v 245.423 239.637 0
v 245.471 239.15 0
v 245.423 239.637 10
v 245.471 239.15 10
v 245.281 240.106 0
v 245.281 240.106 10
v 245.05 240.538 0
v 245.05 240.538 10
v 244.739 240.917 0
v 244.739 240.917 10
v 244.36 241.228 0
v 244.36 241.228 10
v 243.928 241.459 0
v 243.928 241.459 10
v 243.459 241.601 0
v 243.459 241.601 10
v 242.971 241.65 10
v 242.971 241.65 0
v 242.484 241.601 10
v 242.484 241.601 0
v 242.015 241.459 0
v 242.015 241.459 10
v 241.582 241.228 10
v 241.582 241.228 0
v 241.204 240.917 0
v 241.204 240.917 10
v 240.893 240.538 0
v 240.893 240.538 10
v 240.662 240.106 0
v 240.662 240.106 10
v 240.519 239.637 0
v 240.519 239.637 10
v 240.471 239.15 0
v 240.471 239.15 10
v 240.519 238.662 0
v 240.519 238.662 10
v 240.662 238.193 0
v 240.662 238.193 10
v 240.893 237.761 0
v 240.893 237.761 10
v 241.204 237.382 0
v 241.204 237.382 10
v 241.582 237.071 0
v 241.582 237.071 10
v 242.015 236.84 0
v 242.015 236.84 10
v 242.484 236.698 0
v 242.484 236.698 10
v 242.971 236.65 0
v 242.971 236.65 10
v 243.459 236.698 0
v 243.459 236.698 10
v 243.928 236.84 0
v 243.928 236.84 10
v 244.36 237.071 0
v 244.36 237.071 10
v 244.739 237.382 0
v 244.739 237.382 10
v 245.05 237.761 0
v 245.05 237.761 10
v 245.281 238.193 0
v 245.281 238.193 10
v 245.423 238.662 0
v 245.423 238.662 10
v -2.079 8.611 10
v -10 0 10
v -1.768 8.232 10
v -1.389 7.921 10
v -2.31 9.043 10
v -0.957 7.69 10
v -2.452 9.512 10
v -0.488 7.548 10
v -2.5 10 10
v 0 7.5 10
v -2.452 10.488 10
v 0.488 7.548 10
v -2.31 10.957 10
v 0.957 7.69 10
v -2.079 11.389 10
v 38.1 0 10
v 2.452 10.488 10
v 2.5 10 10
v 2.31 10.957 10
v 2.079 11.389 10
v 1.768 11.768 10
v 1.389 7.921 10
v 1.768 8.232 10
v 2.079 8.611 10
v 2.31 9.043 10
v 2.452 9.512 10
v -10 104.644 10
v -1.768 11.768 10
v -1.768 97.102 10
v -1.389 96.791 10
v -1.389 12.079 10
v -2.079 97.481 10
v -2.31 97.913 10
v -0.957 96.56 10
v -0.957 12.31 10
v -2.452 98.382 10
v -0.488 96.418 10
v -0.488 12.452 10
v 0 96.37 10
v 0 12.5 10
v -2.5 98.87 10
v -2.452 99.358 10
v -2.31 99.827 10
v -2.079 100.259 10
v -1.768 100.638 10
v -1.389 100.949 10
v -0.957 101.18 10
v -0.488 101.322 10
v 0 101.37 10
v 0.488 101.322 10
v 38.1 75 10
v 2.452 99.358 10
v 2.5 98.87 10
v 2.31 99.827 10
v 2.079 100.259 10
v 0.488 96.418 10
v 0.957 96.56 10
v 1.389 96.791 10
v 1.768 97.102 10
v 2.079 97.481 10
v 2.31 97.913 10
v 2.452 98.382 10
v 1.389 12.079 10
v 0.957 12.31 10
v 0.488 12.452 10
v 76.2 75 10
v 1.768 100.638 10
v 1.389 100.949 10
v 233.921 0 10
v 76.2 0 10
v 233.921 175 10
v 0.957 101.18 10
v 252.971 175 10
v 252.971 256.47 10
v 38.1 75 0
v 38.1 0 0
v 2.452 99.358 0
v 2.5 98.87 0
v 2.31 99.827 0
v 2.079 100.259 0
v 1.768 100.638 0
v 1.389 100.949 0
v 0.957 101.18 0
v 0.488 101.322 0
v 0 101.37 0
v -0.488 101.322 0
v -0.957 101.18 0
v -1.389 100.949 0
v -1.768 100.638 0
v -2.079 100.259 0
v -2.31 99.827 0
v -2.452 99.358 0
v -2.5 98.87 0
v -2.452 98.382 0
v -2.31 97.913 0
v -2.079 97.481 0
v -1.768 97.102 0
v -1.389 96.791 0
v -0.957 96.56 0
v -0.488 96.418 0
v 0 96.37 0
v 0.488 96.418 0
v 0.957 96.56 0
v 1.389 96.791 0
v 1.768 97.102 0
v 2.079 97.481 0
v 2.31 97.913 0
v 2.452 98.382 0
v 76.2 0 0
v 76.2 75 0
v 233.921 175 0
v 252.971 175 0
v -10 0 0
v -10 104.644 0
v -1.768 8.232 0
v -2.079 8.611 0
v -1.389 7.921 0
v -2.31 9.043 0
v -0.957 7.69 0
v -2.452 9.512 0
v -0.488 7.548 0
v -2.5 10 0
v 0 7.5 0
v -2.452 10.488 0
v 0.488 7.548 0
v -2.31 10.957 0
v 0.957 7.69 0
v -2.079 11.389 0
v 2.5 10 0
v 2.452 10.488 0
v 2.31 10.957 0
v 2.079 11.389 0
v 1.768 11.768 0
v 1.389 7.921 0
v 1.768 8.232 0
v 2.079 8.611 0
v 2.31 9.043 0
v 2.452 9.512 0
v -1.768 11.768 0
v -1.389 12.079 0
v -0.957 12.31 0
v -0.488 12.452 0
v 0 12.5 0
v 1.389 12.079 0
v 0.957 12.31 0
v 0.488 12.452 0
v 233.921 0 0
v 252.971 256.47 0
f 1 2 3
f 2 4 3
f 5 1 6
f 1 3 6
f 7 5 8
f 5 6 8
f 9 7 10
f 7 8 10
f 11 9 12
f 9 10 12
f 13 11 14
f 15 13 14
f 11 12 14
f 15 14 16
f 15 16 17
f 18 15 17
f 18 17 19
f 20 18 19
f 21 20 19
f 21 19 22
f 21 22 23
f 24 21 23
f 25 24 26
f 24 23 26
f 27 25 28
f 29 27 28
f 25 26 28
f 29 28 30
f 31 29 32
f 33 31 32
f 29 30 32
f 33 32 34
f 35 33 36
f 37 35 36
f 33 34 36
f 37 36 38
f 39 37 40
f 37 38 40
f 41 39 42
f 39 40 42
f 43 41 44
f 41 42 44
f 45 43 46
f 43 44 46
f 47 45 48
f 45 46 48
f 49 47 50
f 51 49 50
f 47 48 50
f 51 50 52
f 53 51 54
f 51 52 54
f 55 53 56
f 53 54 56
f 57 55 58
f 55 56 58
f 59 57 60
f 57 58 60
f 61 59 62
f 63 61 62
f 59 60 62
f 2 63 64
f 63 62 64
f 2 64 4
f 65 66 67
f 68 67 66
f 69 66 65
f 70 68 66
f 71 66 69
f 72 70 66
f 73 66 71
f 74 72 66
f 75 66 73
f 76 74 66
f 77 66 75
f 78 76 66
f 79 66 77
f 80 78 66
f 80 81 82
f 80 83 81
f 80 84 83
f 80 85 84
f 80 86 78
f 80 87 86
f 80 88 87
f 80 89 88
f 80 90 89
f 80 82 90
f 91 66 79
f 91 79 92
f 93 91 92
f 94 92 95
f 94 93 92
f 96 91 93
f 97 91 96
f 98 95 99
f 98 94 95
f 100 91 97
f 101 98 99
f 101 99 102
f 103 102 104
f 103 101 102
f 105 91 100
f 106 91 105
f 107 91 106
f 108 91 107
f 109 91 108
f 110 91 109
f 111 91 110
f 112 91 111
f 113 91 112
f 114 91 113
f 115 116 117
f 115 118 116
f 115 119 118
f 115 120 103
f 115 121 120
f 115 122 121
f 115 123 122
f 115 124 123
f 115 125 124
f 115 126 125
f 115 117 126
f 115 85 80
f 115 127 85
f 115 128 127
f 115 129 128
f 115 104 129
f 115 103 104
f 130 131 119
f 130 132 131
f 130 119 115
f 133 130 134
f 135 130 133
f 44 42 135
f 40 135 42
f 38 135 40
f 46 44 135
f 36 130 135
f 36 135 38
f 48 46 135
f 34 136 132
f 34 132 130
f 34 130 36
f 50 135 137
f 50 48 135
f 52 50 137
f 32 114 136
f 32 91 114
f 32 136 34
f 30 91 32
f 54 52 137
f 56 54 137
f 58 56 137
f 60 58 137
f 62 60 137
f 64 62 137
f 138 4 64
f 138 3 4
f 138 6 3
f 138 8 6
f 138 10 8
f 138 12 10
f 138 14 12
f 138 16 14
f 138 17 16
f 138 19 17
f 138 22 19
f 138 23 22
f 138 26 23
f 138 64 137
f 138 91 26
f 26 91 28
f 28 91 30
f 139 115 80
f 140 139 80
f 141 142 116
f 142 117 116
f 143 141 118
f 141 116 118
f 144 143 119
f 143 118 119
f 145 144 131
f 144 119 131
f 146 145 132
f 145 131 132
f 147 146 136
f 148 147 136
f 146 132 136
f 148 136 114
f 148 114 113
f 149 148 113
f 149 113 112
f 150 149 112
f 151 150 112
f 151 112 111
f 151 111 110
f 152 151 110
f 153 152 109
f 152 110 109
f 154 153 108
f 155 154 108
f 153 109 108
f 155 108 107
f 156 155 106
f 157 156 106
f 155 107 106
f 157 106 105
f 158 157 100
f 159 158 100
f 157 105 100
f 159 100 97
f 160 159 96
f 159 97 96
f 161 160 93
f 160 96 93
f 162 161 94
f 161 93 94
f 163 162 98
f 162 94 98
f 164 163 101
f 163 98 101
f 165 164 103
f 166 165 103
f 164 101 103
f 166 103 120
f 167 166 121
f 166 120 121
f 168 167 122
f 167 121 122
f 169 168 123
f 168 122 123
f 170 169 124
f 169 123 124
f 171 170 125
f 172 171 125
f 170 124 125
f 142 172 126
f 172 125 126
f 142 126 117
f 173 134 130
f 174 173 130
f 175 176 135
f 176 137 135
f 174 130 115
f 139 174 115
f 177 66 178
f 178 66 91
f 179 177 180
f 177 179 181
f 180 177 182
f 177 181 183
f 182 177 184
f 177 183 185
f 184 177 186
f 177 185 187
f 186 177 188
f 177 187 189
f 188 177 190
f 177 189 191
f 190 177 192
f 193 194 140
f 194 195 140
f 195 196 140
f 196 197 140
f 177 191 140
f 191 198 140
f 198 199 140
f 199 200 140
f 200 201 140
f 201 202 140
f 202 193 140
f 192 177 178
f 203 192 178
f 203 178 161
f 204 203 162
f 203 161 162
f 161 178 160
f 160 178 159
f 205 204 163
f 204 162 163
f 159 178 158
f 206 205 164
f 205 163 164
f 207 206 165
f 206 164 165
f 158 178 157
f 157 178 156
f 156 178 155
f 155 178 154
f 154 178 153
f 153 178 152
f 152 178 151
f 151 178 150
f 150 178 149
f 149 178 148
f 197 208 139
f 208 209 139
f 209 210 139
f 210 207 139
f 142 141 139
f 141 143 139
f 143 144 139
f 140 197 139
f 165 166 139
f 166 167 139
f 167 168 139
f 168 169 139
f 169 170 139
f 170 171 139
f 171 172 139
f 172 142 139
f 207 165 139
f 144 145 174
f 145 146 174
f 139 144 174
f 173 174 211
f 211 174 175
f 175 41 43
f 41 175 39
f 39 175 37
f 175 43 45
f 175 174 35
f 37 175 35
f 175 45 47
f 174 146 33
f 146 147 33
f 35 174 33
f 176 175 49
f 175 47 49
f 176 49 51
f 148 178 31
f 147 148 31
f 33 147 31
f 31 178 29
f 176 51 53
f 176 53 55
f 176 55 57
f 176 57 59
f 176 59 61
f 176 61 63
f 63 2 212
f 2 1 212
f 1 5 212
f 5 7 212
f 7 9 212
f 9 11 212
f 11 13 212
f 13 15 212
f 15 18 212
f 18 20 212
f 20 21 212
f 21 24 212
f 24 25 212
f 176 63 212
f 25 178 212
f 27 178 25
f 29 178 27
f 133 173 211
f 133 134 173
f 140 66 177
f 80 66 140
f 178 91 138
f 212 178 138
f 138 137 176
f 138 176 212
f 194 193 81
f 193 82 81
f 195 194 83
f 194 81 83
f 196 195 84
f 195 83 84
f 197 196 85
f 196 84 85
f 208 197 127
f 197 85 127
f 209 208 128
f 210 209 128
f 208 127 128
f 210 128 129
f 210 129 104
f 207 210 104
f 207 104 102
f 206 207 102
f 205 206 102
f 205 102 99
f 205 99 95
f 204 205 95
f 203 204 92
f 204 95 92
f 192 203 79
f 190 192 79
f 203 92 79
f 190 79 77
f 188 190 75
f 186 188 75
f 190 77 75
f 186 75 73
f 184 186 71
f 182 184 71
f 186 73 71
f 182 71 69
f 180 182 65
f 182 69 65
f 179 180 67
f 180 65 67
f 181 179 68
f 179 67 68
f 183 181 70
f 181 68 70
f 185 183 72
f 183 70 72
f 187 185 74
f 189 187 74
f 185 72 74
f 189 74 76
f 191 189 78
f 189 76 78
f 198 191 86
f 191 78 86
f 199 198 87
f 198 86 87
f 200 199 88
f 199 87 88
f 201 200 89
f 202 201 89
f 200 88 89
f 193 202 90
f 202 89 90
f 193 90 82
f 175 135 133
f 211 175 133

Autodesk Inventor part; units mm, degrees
ref_plane "YZ Plane" through (0, 0, 0) normal (1, 0, 0) x (0, 1, 0)
ref_plane "XZ Plane" through (0, 0, 0) normal (0, 1, 0) x (-1, 0, 0)
ref_plane "XY Plane" through (0, 0, 0) normal (0, 0, 1) x (1, 0, 0)
sketch "Sketch1" plane through (0, 0, 0) normal (0, 0, 1) x (1, 0, 0)
  line L0 (0, 0) -> (505.9426, 0)
  line L1 (505.9426, 0) -> (505.9426, 98.87)
  line L2 (505.9426, 98.87) -> (0, 98.87)
  line L3 (0, 98.87) -> (0, 0)
  line L4 (0, 98.87) -> (252.9713, 244.923)
  line L5 (252.9713, 244.923) -> (505.9426, 98.87)
  point P0 (252.9713, 98.87)
  dimension "d0" = 505.9426
  dimension "d1" = 98.87
  dimension "d2" = 30
extrude "Extrusion1" add sketch "Sketch1" along normal blind 10
sketch "Sketch2" plane through (0, 0, 10) normal (0, 0, 1) x (1, 0, 0)
  line L0 (0, 98.87) -> (0, 0) projected
  line L1 (252.9713, 244.923) -> (0, 98.87) projected
  line L2 (505.9426, 98.87) -> (252.9713, 244.923) projected
  line L3 (505.9426, 0) -> (505.9426, 98.87) projected
  line L4 (-10, 0) -> (-10, 104.6435)
  line L5 (-10, 104.6435) -> (252.9713, 256.4701)
  line L6 (252.9713, 256.4701) -> (515.9426, 104.6435)
  line L7 (515.9426, 104.6435) -> (515.9426, 0)
  line L8 (-10, 0) -> (0, 0)
  line L9 (0, 0) -> (505.9426, 0) projected
  line L10 (505.9426, 0) -> (515.9426, 0)
  dimension "d5" = 10
extrude "Extrusion2" add sketch "Sketch2" against normal blind 10 contours L0 L8 L4 L5 L6 L7 L10 L3 L2 L1
sketch "Sketch3" plane through (0, 0, 10) normal (0, 0, 1) x (1, 0, 0)
  line L0 (252.9713, 256.4701) -> (515.9426, 104.6435) projected
  line L1 (515.9426, 104.6435) -> (515.9426, 0) projected
  line L2 (252.9713, 256.4701) -> (515.9426, 256.4701)
  line L3 (515.9426, 256.4701) -> (515.9426, 0)
  line L4 (515.9426, 0) -> (252.9713, 0)
  line L5 (252.9713, 0) -> (252.9713, 256.4701)
  point P0 (0, 0)
extrude "Extrusion3" cut sketch "Sketch3" against normal through all
sketch "Sketch4" plane through (0, 0, 10) normal (0, 0, 1) x (1, 0, 0)
  line L0 (252.9713, 0) -> (252.9713, 256.4701) construction
  line L1 (252.9713, 256.4701) -> (-10, 104.6435) construction
  line L2 (-10, 104.6435) -> (-10, 0) construction
  line L3 (-10, 0) -> (252.9713, 0) construction
  line L4 (0, 98.87) -> (242.9713, 239.1495) construction
  line L5 (242.9713, 239.1495) -> (242.9713, 10) construction
  line L6 (242.9713, 10) -> (0, 10) construction
  line L7 (0, 10) -> (0, 98.87) construction
  circle A0 centre (0, 10) radius 2.5
  circle A1 centre (0, 98.87) radius 2.5
  circle A2 centre (242.9713, 239.1495) radius 2.5
  circle A3 centre (242.9713, 10) radius 2.5
  point P0 (0, 0)
  dimension "d10" = 10
  dimension "d11" = 5
  dimension "d12" = 5
  dimension "d13" = 5
  dimension "d14" = 5
extrude "Extrusion4" cut sketch "Sketch4" against normal through all
sketch "Sketch5" plane through (0, 0, 10) normal (0, 0, 1) x (1, 0, 0)
  line L0 (272.0213, 175) -> (233.9213, 175)
  line L1 (233.9213, 175) -> (233.9213, 0)
  line L2 (233.9213, 0) -> (272.0213, 0)
  line L3 (272.0213, 0) -> (272.0213, 175)
  line L4 (-10, 0) -> (252.9713, 0) projected
  line L5 (38.1, 0) -> (76.2, 0)
  line L6 (76.2, 0) -> (76.2, 75)
  line L7 (76.2, 75) -> (38.1, 75)
  line L8 (38.1, 75) -> (38.1, 0)
  line L9 (-10, 0) -> (-10, 104.6435) projected
  point P0 (0, 0)
  point P1 (252.9713, 175)
  dimension "d17" = 38.1
  dimension "d18" = 38.1
  dimension "d19" = 48.1
  dimension "d20" = 75
  dimension "d23" = 175
extrude "Extrusion5" cut sketch "Sketch5" against normal through all
properties part number "BA10" material "ABS Plastic"
